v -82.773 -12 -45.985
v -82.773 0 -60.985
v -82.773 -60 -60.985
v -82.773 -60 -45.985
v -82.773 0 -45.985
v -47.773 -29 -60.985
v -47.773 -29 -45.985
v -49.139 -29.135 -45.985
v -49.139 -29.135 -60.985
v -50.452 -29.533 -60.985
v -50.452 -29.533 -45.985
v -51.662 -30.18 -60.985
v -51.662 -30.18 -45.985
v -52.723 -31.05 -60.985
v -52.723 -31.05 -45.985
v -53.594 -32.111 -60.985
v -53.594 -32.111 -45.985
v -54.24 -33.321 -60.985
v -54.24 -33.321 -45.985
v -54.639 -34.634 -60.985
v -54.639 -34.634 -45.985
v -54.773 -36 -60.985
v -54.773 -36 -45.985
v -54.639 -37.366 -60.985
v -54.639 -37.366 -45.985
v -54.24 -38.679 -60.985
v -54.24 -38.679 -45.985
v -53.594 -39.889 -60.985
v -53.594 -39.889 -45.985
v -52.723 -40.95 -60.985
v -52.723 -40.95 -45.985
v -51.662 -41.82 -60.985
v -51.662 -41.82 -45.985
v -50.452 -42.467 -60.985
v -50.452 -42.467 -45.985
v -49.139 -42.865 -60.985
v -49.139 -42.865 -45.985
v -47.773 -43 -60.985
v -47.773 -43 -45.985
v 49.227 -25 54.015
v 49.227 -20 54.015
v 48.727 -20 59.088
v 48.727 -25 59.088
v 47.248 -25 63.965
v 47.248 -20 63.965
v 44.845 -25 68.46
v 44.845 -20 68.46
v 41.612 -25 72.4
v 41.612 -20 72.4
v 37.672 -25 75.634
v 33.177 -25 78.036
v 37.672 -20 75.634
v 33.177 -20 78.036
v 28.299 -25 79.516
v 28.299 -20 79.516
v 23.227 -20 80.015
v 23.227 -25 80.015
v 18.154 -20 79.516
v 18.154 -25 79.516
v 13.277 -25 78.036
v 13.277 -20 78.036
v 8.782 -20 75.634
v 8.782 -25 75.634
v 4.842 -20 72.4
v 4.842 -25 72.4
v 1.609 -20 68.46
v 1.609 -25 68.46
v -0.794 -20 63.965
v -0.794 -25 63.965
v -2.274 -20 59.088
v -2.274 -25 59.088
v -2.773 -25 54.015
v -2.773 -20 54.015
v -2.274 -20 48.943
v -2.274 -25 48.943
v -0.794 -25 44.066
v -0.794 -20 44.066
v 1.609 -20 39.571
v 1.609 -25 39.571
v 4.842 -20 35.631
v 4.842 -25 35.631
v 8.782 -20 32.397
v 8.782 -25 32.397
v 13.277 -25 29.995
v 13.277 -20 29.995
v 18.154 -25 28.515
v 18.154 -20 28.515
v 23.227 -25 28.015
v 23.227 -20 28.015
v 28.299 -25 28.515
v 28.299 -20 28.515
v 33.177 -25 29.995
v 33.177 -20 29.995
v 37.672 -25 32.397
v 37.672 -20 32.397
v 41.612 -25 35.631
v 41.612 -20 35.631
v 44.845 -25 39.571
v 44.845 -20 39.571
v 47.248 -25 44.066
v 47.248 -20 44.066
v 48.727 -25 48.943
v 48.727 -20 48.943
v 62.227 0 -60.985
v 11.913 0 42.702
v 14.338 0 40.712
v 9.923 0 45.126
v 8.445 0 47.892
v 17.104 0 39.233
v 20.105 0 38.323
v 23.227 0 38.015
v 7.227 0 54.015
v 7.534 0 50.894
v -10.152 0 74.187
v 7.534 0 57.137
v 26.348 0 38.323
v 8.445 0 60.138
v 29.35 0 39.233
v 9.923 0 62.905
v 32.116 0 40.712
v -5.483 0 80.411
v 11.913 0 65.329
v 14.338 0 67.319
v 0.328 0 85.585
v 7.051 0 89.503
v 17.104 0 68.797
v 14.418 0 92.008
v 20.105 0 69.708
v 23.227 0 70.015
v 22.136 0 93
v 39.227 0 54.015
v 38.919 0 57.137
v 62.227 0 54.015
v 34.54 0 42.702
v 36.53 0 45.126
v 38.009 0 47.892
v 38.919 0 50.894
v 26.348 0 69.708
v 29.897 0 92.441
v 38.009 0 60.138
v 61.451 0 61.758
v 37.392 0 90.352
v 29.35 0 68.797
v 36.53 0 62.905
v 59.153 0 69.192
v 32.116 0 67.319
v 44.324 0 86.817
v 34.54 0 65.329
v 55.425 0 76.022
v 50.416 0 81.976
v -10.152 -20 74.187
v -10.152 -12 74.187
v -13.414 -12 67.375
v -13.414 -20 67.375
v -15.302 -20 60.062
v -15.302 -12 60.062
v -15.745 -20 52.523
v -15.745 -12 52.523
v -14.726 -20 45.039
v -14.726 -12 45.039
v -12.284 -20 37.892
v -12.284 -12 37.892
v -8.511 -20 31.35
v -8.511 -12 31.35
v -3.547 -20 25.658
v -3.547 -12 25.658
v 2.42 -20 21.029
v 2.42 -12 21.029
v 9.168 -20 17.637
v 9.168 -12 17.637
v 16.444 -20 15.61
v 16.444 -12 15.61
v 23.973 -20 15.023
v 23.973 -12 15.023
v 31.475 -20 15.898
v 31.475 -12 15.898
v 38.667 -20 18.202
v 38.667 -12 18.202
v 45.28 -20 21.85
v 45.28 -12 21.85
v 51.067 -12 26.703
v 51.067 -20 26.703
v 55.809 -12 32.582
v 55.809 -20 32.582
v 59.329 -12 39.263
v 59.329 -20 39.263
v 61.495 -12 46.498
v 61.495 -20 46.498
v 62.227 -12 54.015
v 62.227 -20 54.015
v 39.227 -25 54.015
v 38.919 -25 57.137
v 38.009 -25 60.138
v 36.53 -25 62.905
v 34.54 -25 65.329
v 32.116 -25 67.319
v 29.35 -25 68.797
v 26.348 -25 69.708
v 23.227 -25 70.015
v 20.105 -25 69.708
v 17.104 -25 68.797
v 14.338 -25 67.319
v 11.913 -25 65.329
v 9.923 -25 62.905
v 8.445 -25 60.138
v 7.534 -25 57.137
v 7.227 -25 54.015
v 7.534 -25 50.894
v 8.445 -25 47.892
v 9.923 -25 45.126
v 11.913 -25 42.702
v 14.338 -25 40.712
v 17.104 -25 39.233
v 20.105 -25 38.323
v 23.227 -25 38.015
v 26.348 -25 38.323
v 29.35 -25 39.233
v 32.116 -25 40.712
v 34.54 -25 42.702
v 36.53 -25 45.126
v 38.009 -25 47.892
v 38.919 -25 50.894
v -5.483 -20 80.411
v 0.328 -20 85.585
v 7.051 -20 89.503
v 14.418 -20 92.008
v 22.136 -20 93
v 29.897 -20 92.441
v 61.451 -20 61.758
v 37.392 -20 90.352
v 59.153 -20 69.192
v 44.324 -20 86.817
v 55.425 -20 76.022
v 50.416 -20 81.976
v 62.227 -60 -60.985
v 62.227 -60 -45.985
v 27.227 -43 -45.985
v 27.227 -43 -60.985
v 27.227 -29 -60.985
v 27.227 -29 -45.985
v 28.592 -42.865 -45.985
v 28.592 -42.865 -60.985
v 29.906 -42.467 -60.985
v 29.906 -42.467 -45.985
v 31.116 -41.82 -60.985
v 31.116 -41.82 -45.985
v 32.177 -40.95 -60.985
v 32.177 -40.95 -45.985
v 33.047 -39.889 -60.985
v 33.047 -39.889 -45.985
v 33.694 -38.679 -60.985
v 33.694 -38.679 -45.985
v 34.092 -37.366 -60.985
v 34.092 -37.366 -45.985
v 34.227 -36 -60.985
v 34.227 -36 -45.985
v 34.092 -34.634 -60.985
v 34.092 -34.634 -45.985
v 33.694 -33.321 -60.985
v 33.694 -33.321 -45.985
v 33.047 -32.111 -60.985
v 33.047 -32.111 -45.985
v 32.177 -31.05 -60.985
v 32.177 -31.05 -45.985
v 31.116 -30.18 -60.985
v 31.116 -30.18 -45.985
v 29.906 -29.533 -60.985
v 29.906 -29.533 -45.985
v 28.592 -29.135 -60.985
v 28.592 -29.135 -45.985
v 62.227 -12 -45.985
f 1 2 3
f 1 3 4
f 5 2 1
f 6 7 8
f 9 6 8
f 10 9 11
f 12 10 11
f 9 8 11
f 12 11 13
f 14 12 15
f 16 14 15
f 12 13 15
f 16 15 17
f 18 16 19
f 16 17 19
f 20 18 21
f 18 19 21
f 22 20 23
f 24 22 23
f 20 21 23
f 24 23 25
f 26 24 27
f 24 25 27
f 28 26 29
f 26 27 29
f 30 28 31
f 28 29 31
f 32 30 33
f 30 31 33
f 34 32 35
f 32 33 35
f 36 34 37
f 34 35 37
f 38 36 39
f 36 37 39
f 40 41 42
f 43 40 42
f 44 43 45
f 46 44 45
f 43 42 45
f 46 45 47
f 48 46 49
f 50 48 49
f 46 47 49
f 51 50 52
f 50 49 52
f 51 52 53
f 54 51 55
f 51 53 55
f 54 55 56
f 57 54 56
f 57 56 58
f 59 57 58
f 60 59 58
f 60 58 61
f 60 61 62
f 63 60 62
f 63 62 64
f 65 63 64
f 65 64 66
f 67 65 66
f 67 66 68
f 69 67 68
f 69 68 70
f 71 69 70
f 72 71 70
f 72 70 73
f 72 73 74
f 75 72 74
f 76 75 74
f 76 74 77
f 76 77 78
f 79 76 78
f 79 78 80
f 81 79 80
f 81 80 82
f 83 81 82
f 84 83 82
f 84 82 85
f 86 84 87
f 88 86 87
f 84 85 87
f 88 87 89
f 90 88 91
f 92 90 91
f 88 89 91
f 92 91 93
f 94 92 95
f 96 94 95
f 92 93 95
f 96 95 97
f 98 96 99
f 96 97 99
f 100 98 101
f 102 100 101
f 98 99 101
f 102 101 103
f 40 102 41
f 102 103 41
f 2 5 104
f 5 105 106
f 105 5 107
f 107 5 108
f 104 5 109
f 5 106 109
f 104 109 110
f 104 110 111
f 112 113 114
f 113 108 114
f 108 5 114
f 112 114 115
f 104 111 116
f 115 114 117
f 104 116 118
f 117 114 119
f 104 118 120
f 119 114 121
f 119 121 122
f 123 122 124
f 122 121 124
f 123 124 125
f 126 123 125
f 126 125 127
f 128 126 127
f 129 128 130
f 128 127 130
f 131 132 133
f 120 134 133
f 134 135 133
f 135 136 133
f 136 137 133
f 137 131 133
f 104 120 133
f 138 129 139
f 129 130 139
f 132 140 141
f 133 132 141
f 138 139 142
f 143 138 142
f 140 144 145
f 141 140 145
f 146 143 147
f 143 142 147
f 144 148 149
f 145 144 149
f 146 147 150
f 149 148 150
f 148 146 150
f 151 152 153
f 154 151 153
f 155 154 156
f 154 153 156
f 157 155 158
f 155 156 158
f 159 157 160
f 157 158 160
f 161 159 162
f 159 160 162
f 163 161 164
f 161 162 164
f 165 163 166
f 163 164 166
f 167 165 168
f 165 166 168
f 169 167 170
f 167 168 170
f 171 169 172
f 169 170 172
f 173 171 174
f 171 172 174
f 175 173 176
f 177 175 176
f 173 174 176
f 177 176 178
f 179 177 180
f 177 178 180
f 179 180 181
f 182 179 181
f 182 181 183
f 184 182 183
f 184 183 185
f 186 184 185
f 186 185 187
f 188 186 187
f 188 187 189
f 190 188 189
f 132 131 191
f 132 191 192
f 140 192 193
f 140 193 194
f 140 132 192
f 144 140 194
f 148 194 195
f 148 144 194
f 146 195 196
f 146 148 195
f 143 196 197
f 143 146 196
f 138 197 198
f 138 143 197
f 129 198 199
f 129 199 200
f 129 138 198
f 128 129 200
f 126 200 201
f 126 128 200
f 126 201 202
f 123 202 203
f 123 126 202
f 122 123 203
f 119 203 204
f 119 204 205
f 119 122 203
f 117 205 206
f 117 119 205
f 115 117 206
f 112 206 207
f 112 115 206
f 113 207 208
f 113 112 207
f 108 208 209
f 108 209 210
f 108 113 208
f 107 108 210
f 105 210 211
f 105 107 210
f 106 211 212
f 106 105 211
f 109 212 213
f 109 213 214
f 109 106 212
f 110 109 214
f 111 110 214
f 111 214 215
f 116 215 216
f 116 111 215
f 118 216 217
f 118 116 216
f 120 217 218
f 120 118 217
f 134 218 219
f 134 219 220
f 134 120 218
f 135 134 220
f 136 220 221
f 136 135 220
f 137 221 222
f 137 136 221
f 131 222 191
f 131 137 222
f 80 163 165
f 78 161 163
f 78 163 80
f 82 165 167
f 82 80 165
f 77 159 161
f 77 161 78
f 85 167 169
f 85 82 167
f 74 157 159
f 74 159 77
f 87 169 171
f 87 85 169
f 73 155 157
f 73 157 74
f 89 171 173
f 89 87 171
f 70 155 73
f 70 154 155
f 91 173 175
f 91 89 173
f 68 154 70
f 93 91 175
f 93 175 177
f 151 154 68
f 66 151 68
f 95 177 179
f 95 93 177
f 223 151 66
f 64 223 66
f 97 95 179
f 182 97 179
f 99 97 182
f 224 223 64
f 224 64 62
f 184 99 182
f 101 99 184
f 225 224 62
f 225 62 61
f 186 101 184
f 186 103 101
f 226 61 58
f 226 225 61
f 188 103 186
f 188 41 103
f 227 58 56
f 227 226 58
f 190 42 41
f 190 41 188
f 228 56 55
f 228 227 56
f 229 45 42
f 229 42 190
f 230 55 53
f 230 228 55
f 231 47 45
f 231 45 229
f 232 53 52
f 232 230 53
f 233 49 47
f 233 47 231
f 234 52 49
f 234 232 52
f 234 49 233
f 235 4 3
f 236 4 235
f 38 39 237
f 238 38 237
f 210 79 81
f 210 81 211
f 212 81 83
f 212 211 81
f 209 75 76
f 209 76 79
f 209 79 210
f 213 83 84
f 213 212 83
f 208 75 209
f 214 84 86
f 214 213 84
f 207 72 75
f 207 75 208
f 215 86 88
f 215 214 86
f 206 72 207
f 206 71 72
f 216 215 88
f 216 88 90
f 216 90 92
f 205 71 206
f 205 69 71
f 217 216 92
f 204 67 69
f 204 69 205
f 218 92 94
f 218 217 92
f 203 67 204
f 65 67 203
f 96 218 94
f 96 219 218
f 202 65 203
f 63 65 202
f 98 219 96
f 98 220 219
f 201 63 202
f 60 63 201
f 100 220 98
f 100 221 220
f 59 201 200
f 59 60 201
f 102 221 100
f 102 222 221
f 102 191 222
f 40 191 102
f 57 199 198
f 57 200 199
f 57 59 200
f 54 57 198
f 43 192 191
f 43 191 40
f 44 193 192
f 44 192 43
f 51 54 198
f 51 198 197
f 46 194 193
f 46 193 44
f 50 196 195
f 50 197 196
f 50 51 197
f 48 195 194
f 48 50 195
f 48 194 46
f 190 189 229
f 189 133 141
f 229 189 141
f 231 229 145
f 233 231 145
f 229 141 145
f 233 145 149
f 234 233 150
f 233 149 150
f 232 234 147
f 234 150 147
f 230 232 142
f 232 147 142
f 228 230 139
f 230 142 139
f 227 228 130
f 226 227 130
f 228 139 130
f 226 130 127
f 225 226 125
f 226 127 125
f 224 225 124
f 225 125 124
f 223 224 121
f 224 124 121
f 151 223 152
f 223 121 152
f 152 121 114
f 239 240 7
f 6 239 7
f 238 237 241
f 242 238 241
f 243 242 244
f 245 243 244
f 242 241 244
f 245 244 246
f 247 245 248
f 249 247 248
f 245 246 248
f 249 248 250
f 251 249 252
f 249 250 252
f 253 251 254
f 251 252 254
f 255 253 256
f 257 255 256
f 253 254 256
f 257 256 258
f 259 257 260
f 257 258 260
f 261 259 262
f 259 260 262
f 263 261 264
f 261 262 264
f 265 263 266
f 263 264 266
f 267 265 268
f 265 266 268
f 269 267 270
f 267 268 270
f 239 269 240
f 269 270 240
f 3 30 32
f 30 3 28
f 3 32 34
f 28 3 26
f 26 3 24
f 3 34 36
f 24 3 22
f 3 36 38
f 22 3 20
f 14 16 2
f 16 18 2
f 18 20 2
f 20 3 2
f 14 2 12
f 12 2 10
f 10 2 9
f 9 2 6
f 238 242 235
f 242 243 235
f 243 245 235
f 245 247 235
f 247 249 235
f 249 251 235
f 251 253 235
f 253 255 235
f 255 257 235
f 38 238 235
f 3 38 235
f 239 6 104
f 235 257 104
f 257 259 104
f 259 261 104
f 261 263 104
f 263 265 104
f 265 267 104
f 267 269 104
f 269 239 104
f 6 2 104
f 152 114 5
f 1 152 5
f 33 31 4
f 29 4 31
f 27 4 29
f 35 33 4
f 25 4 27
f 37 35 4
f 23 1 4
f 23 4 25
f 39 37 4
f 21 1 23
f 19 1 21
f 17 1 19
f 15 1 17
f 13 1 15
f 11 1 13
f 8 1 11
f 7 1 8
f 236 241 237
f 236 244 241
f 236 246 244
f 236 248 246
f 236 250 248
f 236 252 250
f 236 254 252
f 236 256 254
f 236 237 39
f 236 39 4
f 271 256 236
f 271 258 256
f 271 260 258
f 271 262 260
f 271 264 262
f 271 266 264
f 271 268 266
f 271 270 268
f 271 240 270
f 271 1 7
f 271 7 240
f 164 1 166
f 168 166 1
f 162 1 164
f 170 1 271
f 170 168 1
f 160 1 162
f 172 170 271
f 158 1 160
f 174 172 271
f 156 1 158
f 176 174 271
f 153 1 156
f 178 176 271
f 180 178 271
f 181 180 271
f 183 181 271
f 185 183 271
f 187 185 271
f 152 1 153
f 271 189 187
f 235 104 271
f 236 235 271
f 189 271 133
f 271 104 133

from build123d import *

# Parameters (mm, degrees)
F0_R     = 26
F0_R_2   = 16
F1_DEPTH = 25
F2_DEPTH = 20
F3_DEPTH = 12
F0_W     = 145
F0_H     = 15
F4_DEPTH = 60
F6_DEPTH = 25


with BuildPart() as f1:
    # F0 (on Front) → F1 (new body)
    with BuildSketch(Plane.XZ):
        with Locations((23.226776, 54.015426)):
            Circle(F0_R)
        with Locations((23.226776, 54.015426)):
            Circle(F0_R_2, mode=Mode.SUBTRACT)
    extrude(amount=F1_DEPTH)

    # F0 (on Front) → F2 (join)
    with BuildSketch(Plane.XZ):
        with BuildLine():
            ThreePointArc((62.226776, 54.015426), (33.696714, 91.583769), (-10.151705, 74.186617))
            ThreePointArc((-10.151705, 74.186617), (12.756838, 16.447083), (62.226776, 54.015426))
        make_face()
        with Locations((23.226776, 54.015426)):
            Circle(F0_R, mode=Mode.SUBTRACT)
    extrude(amount=F2_DEPTH)

    # F0 (on Front) → F3 (join)
    with BuildSketch(Plane.XZ):
        with BuildLine():
            Line((-10.151705, 74.186617), (-82.773224, -45.984574))
            Line((-82.773224, -45.984574), (62.226776, -45.984574))
            Line((62.226776, -45.984574), (62.226776, 54.015426))
            ThreePointArc((62.226776, 54.015426), (12.756838, 16.447083), (-10.151705, 74.186617))
        make_face()
    extrude(amount=F3_DEPTH)

    # F0 (on Front) → F4 (join)
    with BuildSketch(Plane.XZ):
        with Locations((-10.273224, -53.484574)):
            Rectangle(F0_W, F0_H)
    extrude(amount=F4_DEPTH)

    # F5 (on face) → F6 (cut)
    with BuildSketch(Plane.XY.offset(-45.984574)):
        with BuildLine():
            Line((27.226776, -29), (-47.773224, -29))
            ThreePointArc((-47.773224, -29), (-54.773224, -36), (-47.773224, -43))
            Line((-47.773224, -43), (27.226776, -43))
            ThreePointArc((27.226776, -43), (34.226776, -36), (27.226776, -29))
        make_face()
    extrude(amount=-F6_DEPTH, mode=Mode.SUBTRACT)


solid = f1.part
